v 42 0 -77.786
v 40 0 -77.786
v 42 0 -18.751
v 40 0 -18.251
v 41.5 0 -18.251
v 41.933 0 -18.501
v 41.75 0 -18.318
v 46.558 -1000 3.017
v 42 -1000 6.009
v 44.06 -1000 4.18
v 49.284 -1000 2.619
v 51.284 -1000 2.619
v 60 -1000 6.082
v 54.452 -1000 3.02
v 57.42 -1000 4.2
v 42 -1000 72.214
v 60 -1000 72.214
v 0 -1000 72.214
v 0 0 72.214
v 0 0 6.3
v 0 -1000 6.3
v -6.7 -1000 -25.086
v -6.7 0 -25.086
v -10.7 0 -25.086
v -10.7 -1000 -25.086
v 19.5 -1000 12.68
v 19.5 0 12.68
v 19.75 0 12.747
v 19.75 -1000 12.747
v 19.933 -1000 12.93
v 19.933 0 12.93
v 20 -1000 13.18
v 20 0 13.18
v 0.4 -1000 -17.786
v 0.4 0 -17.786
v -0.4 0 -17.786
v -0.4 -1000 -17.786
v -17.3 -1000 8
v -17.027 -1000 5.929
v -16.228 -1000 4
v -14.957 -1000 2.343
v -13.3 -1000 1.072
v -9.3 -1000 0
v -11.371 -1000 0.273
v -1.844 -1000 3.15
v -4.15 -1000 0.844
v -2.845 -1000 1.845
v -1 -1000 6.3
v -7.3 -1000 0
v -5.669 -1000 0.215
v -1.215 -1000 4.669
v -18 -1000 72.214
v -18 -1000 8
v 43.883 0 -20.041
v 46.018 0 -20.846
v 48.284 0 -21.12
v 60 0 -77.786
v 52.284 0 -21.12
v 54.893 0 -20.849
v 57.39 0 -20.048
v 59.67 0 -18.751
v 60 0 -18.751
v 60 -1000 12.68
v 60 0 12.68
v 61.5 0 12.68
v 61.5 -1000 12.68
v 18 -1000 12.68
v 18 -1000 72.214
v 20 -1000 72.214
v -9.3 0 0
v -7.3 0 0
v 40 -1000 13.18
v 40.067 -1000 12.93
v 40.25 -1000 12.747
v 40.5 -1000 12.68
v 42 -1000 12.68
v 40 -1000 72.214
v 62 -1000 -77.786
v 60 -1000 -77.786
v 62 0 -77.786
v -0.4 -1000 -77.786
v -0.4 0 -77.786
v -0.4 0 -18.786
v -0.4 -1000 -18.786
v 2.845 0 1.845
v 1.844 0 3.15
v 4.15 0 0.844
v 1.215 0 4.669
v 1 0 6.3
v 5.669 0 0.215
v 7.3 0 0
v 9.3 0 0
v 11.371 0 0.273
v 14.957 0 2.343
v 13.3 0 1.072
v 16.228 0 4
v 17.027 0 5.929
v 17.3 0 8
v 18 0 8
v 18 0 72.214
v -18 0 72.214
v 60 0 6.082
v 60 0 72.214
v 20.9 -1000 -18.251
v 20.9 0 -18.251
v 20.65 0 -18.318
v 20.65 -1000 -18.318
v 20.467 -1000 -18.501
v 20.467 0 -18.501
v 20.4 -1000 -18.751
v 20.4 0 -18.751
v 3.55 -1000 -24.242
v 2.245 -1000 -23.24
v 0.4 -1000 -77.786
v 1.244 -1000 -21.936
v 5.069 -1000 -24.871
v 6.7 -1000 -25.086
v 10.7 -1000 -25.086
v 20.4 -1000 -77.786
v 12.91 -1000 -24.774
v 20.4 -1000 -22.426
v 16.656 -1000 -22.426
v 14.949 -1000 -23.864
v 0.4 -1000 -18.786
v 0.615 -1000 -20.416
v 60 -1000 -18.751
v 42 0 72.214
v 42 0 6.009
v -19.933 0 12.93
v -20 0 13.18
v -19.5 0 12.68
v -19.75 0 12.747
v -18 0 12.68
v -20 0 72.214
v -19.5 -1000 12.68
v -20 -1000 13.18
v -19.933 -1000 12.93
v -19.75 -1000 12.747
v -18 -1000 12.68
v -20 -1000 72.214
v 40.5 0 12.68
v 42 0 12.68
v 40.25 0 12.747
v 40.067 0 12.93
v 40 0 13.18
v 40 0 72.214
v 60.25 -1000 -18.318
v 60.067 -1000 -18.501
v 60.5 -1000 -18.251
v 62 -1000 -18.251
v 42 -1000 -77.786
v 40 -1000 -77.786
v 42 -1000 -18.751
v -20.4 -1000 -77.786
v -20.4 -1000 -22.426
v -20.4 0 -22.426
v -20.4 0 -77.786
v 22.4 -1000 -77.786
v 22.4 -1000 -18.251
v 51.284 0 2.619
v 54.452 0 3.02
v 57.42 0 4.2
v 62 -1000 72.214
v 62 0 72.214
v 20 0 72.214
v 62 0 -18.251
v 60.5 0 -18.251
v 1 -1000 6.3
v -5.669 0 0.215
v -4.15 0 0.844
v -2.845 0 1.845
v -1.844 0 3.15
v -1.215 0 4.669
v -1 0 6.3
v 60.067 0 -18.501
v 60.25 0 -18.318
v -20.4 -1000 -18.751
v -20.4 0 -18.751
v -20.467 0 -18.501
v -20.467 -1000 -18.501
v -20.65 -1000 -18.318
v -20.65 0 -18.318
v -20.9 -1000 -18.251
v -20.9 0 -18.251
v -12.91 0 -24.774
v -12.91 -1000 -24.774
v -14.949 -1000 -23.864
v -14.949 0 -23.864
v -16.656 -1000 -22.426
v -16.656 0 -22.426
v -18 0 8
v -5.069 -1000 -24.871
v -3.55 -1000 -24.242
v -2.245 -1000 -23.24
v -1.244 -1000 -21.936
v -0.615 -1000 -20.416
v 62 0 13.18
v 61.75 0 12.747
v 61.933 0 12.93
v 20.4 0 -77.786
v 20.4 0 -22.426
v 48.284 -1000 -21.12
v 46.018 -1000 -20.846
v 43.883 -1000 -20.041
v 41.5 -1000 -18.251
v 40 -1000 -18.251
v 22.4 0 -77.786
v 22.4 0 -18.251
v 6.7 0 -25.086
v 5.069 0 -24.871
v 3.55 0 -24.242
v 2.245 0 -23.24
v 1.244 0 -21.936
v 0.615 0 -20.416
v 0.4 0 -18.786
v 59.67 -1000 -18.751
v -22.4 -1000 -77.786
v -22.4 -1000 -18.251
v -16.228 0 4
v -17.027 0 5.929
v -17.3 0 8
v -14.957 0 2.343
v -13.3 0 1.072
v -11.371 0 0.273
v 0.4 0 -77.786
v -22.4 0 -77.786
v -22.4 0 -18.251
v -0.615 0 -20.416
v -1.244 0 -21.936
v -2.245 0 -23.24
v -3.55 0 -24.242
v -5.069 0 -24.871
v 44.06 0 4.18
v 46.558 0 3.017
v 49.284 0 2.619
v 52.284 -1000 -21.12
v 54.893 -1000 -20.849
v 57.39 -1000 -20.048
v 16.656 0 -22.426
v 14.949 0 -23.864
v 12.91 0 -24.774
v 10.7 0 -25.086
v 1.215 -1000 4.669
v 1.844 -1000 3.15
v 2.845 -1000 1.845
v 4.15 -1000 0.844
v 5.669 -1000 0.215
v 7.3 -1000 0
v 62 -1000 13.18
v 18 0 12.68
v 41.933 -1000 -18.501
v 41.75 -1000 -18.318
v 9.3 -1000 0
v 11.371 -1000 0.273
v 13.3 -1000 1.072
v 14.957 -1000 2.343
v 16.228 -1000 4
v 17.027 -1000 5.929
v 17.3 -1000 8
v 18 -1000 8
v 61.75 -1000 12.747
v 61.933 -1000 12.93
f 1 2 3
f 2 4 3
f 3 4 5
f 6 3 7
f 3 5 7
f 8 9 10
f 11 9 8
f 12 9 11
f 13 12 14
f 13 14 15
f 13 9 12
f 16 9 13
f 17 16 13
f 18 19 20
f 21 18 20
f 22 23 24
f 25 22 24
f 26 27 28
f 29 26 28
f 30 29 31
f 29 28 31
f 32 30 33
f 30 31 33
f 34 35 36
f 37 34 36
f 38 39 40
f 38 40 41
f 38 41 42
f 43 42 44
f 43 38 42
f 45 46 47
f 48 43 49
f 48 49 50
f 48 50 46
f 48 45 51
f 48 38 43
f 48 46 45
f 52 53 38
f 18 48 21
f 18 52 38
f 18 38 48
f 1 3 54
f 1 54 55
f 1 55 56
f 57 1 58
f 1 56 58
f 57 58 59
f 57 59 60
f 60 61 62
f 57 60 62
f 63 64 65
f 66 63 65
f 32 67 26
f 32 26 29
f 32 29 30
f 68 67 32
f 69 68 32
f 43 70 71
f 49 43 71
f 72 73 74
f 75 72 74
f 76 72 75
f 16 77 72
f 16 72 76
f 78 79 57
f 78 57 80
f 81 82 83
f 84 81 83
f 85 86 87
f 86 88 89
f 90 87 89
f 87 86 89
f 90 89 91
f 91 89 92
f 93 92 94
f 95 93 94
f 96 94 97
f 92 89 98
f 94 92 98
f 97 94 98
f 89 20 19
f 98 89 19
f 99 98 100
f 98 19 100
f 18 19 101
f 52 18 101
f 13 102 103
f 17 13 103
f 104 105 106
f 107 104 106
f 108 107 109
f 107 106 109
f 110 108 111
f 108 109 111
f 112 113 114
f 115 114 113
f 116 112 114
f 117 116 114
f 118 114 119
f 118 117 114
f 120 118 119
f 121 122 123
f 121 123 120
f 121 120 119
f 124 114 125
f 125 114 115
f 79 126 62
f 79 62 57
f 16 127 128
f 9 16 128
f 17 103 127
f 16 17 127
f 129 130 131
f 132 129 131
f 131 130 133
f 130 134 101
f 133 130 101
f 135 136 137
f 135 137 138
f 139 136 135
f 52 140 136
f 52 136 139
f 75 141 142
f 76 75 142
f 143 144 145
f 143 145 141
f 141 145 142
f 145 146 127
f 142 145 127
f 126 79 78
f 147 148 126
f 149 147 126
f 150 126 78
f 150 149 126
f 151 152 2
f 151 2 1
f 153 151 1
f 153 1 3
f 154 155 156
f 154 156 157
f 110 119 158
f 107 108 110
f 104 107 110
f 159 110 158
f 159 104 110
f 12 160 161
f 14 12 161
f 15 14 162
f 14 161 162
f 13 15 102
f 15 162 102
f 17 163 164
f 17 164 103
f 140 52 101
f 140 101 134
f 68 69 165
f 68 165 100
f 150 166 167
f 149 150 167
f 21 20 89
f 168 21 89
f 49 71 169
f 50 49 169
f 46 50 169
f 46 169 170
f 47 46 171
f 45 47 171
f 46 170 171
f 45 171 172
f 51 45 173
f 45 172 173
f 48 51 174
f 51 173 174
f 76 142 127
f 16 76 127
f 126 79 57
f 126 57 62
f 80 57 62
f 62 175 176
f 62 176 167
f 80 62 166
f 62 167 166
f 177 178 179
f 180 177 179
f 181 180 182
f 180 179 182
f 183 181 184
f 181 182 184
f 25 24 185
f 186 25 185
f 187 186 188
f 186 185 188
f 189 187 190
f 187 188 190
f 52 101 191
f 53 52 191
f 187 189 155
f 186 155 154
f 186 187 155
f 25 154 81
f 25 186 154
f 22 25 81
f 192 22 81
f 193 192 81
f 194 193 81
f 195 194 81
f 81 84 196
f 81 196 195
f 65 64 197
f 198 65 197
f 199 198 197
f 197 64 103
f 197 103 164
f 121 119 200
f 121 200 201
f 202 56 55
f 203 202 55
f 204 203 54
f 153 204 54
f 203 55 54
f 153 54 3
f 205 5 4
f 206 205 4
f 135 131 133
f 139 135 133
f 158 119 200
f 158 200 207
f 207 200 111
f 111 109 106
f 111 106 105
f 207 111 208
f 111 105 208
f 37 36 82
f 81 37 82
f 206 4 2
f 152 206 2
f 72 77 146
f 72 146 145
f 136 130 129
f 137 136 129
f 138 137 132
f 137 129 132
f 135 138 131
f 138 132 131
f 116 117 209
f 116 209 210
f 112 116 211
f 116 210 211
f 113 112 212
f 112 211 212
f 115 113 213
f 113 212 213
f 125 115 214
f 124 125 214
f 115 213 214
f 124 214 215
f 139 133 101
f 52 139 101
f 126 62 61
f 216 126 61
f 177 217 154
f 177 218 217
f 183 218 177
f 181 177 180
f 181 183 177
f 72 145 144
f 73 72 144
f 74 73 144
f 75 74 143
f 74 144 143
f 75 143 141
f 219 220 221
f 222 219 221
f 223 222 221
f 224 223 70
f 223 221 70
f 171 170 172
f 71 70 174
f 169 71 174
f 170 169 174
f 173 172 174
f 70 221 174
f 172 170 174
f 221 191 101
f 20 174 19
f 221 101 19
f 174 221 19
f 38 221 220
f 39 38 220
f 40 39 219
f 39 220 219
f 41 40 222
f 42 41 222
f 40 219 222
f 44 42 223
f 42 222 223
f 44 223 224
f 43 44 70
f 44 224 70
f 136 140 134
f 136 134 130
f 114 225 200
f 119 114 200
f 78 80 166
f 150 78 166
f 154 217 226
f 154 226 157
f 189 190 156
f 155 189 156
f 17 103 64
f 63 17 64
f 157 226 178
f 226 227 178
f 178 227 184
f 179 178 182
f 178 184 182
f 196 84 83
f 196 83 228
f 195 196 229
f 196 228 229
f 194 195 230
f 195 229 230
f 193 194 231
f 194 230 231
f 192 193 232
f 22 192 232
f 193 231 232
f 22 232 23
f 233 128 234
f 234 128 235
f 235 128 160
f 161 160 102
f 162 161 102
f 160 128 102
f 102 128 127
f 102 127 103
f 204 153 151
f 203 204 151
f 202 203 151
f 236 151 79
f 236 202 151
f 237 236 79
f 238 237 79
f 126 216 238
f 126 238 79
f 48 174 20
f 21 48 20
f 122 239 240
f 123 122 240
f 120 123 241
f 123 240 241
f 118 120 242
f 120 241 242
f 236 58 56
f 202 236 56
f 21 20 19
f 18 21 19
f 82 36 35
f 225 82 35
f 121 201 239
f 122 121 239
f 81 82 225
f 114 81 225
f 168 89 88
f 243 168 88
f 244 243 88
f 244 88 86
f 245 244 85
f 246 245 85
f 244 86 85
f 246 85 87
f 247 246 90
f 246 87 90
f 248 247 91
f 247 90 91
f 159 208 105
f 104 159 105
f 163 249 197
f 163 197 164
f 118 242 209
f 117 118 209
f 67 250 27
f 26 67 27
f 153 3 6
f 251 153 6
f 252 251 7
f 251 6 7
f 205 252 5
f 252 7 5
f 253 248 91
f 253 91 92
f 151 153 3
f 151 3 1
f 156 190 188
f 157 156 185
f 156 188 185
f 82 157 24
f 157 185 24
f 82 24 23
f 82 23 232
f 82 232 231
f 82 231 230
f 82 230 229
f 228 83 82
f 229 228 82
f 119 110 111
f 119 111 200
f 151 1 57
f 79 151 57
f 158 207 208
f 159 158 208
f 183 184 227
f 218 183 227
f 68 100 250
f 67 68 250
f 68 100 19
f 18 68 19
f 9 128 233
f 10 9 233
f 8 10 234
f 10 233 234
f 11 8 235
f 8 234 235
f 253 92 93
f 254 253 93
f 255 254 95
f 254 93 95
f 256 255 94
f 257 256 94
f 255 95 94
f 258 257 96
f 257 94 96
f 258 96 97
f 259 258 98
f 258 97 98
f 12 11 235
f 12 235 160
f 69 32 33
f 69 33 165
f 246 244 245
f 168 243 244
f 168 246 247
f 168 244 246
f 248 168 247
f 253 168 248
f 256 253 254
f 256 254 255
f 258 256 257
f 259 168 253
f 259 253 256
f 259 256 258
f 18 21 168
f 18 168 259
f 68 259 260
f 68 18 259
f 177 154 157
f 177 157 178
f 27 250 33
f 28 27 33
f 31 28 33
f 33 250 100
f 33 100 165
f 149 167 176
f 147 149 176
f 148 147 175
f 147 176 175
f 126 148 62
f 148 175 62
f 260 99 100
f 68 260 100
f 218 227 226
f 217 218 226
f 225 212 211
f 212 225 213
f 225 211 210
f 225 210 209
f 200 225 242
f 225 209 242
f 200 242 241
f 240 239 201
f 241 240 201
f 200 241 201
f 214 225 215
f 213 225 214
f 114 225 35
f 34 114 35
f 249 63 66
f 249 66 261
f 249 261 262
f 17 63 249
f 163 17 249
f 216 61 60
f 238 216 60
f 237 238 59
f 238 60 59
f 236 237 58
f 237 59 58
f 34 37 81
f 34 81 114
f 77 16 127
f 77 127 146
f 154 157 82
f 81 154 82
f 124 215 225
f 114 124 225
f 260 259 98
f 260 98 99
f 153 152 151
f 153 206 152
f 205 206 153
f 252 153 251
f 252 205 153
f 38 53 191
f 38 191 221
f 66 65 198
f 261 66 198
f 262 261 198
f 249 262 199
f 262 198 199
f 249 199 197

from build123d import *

# Parameters (mm, degrees)
F2_DEPTH = 1000
F3_DEPTH = 1000
F4_DEPTH = 1000


with BuildPart() as f2:
    # F1 (on Front) → F2 (new body)
    with BuildSketch(Plane.XZ):
        with BuildLine():
            Line((0, 72.2142957122), (-18, 72.2142957122))
            Line((-18, 72.2142957122), (-18, 12.6796430446))
            Line((-18, 12.6796430446), (-18, 8))
            Line((-18, 8), (-17.3, 8))
            ThreePointArc((-17.3, 8), (-14.9568542495, 2.3431457505), (-9.3, 0))
            Line((-9.3, 0), (-7.3, 0))
            ThreePointArc((-7.3, 0), (-2.8452272785, 1.8452272785), (-1, 6.3))
            Line((-1, 6.3), (0, 6.3))
            Line((0, 6.3), (0, 72.2142957122))
        make_face()
    extrude(amount=F2_DEPTH)


with BuildPart() as f2b:
    # F1 (on Front) → F2, piece 2 (new body)
    with BuildSketch(Plane.XZ):
        with BuildLine():
            Line((-0.4, -77.7857042878), (-0.4, -18.7857042878))
            ThreePointArc((-0.4, -18.7857042878), (-2.2452272785, -23.2404770092), (-6.7, -25.0857042878))
            Line((-6.7, -25.0857042878), (-10.7, -25.0857042878))
            ThreePointArc((-10.7, -25.0857042878), (-13.9615206488, -24.3906671937), (-16.6563218391, -22.4263250522))
            Line((-16.6563218391, -22.4263250522), (-20.4, -22.4263250522))
            Line((-20.4, -22.4263250522), (-20.4, -77.7857042878))
            Line((-20.4, -77.7857042878), (-0.4, -77.7857042878))
        make_face()
    extrude(amount=F2_DEPTH)


with BuildPart() as f2c:
    # F1 (on Front) → F2, piece 3 (new body)
    with BuildSketch(Plane.XZ):
        with BuildLine():
            Line((60, 72.2142957122), (42, 72.2142957122))
            Line((42, 72.2142957122), (42, 12.6796430446))
            Line((42, 12.6796430446), (42, 6.0090078464))
            ThreePointArc((42, 6.0090078464), (45.2668281726, 3.507846704), (49.2839814408, 2.6187724724))
            Line((49.2839814408, 2.6187724724), (51.2839814408, 2.6187724724))
            ThreePointArc((51.2839814408, 2.6187724724), (55.9733785001, 3.5162492158), (60, 6.0818346423))
            Line((60, 6.0818346423), (60, 12.6796430446))
            Line((60, 12.6796430446), (60, 72.2142957122))
        make_face()
    extrude(amount=F2_DEPTH)


with BuildPart() as f2d:
    # F1 (on Front) → F2, piece 4 (new body)
    with BuildSketch(Plane.XZ):
        with BuildLine():
            Line((42, -18.7510516201), (42, -77.7857042878))
            Line((42, -77.7857042878), (60, -77.7857042878))
            Line((60, -77.7857042878), (60, -18.7510516201))
            Line((60, -18.7510516201), (59.6699790691, -18.7510516201))
            ThreePointArc((59.6699790691, -18.7510516201), (56.1622351503, -20.5130411077), (52.2839814408, -21.1196897043))
            Line((52.2839814408, -21.1196897043), (48.2839814408, -21.1196897043))
            ThreePointArc((48.2839814408, -21.1196897043), (44.9261968616, -20.507870367), (42, -18.7510516201))
        make_face()
    extrude(amount=F2_DEPTH)


with BuildPart() as f3:
    # F1 (on Front) → F3 (new body)
    with BuildSketch(Plane.XZ):
        with BuildLine():
            ThreePointArc((6.7, -25.0857042878), (2.2452272785, -23.2404770092), (0.4, -18.7857042878))
            Line((0.4, -18.7857042878), (0.4, -77.7857042878))
            Line((0.4, -77.7857042878), (20.4, -77.7857042878))
            Line((20.4, -77.7857042878), (20.4, -22.4263250522))
            Line((20.4, -22.4263250522), (16.6563218391, -22.4263250522))
            ThreePointArc((16.6563218391, -22.4263250522), (13.9615206488, -24.3906671937), (10.7, -25.0857042878))
            Line((10.7, -25.0857042878), (6.7, -25.0857042878))
        make_face()
    extrude(amount=F3_DEPTH)


with BuildPart() as f3b:
    # F1 (on Front) → F3, piece 2 (new body)
    with BuildSketch(Plane.XZ):
        with BuildLine():
            Line((18, 72.2142957122), (0, 72.2142957122))
            Line((0, 72.2142957122), (0, 6.3))
            Line((0, 6.3), (1, 6.3))
            ThreePointArc((1, 6.3), (2.8452272785, 1.8452272785), (7.3, 0))
            Line((7.3, 0), (9.3, 0))
            ThreePointArc((9.3, 0), (14.9568542495, 2.3431457505), (17.3, 8))
            Line((17.3, 8), (18, 8))
            Line((18, 8), (18, 12.6796430446))
            Line((18, 12.6796430446), (18, 72.2142957122))
        make_face()
    extrude(amount=F3_DEPTH)


with BuildPart() as f4:
    # F1 (on Front) → F4 (new body)
    with BuildSketch(Plane.XZ):
        with BuildLine():
            Line((-22.4, -77.7857042878), (-20.4, -77.7857042878))
            Line((-20.4, -77.7857042878), (-20.4, -22.4263250522))
            Line((-20.4, -22.4263250522), (-20.4, -18.7510516201))
            ThreePointArc((-20.4, -18.7510516201), (-20.5464466094, -18.3974982295), (-20.9, -18.2510516201))
            Line((-20.9, -18.2510516201), (-22.4, -18.2510516201))
            Line((-22.4, -18.2510516201), (-22.4, -77.7857042878))
        make_face()
    extrude(amount=F4_DEPTH)


with BuildPart() as f4b:
    # F1 (on Front) → F4, piece 2 (new body)
    with BuildSketch(Plane.XZ):
        Polygon((0.4, -17.7857042878), (-0.4, -17.7857042878), (-0.4, -18.7857042878), (-0.4, -77.7857042878), (0.4, -77.7857042878), (0.4, -18.7857042878), align=None)
    extrude(amount=F4_DEPTH)


with BuildPart() as f4c:
    # F1 (on Front) → F4, piece 3 (new body)
    with BuildSketch(Plane.XZ):
        with BuildLine():
            Line((20.4, -22.4263250522), (20.4, -77.7857042878))
            Line((20.4, -77.7857042878), (22.4, -77.7857042878))
            Line((22.4, -77.7857042878), (22.4, -18.2510516201))
            Line((22.4, -18.2510516201), (20.9, -18.2510516201))
            ThreePointArc((20.9, -18.2510516201), (20.5464466094, -18.3974982295), (20.4, -18.7510516201))
            Line((20.4, -18.7510516201), (20.4, -22.4263250522))
        make_face()
    extrude(amount=F4_DEPTH)


with BuildPart() as f4d:
    # F1 (on Front) → F4, piece 4 (new body)
    with BuildSketch(Plane.XZ):
        with BuildLine():
            Line((-18, 12.6796430446), (-18, 72.2142957122))
            Line((-18, 72.2142957122), (-20, 72.2142957122))
            Line((-20, 72.2142957122), (-20, 13.1796430446))
            ThreePointArc((-20, 13.1796430446), (-19.8535533906, 12.826089654), (-19.5, 12.6796430446))
            Line((-19.5, 12.6796430446), (-18, 12.6796430446))
        make_face()
    extrude(amount=F4_DEPTH)


with BuildPart() as f4e:
    # F1 (on Front) → F4, piece 5 (new body)
    with BuildSketch(Plane.XZ):
        with BuildLine():
            Line((20, 72.2142957122), (18, 72.2142957122))
            Line((18, 72.2142957122), (18, 12.6796430446))
            Line((18, 12.6796430446), (19.5, 12.6796430446))
            ThreePointArc((19.5, 12.6796430446), (19.8535533906, 12.826089654), (20, 13.1796430446))
            Line((20, 13.1796430446), (20, 72.2142957122))
        make_face()
    extrude(amount=F4_DEPTH)


with BuildPart() as f4f:
    # F1 (on Front) → F4, piece 6 (new body)
    with BuildSketch(Plane.XZ):
        with BuildLine():
            Line((62, 72.2142957122), (60, 72.2142957122))
            Line((60, 72.2142957122), (60, 12.6796430446))
            Line((60, 12.6796430446), (61.5, 12.6796430446))
            ThreePointArc((61.5, 12.6796430446), (61.8535533906, 12.826089654), (62, 13.1796430446))
            Line((62, 13.1796430446), (62, 72.2142957122))
        make_face()
    extrude(amount=F4_DEPTH)


with BuildPart() as f4g:
    # F1 (on Front) → F4, piece 7 (new body)
    with BuildSketch(Plane.XZ):
        with BuildLine():
            Line((42, 12.6796430446), (42, 72.2142957122))
            Line((42, 72.2142957122), (40, 72.2142957122))
            Line((40, 72.2142957122), (40, 13.1796430446))
            ThreePointArc((40, 13.1796430446), (40.1464466094, 12.826089654), (40.5, 12.6796430446))
            Line((40.5, 12.6796430446), (42, 12.6796430446))
        make_face()
    extrude(amount=F4_DEPTH)


with BuildPart() as f4h:
    # F1 (on Front) → F4, piece 8 (new body)
    with BuildSketch(Plane.XZ):
        with BuildLine():
            Line((40, -77.7857042878), (42, -77.7857042878))
            Line((42, -77.7857042878), (42, -18.7510516201))
            ThreePointArc((42, -18.7510516201), (41.8535533906, -18.3974982295), (41.5, -18.2510516201))
            Line((41.5, -18.2510516201), (40, -18.2510516201))
            Line((40, -18.2510516201), (40, -77.7857042878))
        make_face()
    extrude(amount=F4_DEPTH)


with BuildPart() as f4i:
    # F1 (on Front) → F4, piece 9 (new body)
    with BuildSketch(Plane.XZ):
        with BuildLine():
            Line((60, -18.7510516201), (60, -77.7857042878))
            Line((60, -77.7857042878), (62, -77.7857042878))
            Line((62, -77.7857042878), (62, -18.2510516201))
            Line((62, -18.2510516201), (60.5, -18.2510516201))
            ThreePointArc((60.5, -18.2510516201), (60.1464466094, -18.3974982295), (60, -18.7510516201))
        make_face()
    extrude(amount=F4_DEPTH)


solid = Compound([f2.part, f2b.part, f2c.part, f2d.part, f3.part, f3b.part, f4.part, f4b.part, f4c.part, f4d.part, f4e.part, f4f.part, f4g.part, f4h.part, f4i.part])
